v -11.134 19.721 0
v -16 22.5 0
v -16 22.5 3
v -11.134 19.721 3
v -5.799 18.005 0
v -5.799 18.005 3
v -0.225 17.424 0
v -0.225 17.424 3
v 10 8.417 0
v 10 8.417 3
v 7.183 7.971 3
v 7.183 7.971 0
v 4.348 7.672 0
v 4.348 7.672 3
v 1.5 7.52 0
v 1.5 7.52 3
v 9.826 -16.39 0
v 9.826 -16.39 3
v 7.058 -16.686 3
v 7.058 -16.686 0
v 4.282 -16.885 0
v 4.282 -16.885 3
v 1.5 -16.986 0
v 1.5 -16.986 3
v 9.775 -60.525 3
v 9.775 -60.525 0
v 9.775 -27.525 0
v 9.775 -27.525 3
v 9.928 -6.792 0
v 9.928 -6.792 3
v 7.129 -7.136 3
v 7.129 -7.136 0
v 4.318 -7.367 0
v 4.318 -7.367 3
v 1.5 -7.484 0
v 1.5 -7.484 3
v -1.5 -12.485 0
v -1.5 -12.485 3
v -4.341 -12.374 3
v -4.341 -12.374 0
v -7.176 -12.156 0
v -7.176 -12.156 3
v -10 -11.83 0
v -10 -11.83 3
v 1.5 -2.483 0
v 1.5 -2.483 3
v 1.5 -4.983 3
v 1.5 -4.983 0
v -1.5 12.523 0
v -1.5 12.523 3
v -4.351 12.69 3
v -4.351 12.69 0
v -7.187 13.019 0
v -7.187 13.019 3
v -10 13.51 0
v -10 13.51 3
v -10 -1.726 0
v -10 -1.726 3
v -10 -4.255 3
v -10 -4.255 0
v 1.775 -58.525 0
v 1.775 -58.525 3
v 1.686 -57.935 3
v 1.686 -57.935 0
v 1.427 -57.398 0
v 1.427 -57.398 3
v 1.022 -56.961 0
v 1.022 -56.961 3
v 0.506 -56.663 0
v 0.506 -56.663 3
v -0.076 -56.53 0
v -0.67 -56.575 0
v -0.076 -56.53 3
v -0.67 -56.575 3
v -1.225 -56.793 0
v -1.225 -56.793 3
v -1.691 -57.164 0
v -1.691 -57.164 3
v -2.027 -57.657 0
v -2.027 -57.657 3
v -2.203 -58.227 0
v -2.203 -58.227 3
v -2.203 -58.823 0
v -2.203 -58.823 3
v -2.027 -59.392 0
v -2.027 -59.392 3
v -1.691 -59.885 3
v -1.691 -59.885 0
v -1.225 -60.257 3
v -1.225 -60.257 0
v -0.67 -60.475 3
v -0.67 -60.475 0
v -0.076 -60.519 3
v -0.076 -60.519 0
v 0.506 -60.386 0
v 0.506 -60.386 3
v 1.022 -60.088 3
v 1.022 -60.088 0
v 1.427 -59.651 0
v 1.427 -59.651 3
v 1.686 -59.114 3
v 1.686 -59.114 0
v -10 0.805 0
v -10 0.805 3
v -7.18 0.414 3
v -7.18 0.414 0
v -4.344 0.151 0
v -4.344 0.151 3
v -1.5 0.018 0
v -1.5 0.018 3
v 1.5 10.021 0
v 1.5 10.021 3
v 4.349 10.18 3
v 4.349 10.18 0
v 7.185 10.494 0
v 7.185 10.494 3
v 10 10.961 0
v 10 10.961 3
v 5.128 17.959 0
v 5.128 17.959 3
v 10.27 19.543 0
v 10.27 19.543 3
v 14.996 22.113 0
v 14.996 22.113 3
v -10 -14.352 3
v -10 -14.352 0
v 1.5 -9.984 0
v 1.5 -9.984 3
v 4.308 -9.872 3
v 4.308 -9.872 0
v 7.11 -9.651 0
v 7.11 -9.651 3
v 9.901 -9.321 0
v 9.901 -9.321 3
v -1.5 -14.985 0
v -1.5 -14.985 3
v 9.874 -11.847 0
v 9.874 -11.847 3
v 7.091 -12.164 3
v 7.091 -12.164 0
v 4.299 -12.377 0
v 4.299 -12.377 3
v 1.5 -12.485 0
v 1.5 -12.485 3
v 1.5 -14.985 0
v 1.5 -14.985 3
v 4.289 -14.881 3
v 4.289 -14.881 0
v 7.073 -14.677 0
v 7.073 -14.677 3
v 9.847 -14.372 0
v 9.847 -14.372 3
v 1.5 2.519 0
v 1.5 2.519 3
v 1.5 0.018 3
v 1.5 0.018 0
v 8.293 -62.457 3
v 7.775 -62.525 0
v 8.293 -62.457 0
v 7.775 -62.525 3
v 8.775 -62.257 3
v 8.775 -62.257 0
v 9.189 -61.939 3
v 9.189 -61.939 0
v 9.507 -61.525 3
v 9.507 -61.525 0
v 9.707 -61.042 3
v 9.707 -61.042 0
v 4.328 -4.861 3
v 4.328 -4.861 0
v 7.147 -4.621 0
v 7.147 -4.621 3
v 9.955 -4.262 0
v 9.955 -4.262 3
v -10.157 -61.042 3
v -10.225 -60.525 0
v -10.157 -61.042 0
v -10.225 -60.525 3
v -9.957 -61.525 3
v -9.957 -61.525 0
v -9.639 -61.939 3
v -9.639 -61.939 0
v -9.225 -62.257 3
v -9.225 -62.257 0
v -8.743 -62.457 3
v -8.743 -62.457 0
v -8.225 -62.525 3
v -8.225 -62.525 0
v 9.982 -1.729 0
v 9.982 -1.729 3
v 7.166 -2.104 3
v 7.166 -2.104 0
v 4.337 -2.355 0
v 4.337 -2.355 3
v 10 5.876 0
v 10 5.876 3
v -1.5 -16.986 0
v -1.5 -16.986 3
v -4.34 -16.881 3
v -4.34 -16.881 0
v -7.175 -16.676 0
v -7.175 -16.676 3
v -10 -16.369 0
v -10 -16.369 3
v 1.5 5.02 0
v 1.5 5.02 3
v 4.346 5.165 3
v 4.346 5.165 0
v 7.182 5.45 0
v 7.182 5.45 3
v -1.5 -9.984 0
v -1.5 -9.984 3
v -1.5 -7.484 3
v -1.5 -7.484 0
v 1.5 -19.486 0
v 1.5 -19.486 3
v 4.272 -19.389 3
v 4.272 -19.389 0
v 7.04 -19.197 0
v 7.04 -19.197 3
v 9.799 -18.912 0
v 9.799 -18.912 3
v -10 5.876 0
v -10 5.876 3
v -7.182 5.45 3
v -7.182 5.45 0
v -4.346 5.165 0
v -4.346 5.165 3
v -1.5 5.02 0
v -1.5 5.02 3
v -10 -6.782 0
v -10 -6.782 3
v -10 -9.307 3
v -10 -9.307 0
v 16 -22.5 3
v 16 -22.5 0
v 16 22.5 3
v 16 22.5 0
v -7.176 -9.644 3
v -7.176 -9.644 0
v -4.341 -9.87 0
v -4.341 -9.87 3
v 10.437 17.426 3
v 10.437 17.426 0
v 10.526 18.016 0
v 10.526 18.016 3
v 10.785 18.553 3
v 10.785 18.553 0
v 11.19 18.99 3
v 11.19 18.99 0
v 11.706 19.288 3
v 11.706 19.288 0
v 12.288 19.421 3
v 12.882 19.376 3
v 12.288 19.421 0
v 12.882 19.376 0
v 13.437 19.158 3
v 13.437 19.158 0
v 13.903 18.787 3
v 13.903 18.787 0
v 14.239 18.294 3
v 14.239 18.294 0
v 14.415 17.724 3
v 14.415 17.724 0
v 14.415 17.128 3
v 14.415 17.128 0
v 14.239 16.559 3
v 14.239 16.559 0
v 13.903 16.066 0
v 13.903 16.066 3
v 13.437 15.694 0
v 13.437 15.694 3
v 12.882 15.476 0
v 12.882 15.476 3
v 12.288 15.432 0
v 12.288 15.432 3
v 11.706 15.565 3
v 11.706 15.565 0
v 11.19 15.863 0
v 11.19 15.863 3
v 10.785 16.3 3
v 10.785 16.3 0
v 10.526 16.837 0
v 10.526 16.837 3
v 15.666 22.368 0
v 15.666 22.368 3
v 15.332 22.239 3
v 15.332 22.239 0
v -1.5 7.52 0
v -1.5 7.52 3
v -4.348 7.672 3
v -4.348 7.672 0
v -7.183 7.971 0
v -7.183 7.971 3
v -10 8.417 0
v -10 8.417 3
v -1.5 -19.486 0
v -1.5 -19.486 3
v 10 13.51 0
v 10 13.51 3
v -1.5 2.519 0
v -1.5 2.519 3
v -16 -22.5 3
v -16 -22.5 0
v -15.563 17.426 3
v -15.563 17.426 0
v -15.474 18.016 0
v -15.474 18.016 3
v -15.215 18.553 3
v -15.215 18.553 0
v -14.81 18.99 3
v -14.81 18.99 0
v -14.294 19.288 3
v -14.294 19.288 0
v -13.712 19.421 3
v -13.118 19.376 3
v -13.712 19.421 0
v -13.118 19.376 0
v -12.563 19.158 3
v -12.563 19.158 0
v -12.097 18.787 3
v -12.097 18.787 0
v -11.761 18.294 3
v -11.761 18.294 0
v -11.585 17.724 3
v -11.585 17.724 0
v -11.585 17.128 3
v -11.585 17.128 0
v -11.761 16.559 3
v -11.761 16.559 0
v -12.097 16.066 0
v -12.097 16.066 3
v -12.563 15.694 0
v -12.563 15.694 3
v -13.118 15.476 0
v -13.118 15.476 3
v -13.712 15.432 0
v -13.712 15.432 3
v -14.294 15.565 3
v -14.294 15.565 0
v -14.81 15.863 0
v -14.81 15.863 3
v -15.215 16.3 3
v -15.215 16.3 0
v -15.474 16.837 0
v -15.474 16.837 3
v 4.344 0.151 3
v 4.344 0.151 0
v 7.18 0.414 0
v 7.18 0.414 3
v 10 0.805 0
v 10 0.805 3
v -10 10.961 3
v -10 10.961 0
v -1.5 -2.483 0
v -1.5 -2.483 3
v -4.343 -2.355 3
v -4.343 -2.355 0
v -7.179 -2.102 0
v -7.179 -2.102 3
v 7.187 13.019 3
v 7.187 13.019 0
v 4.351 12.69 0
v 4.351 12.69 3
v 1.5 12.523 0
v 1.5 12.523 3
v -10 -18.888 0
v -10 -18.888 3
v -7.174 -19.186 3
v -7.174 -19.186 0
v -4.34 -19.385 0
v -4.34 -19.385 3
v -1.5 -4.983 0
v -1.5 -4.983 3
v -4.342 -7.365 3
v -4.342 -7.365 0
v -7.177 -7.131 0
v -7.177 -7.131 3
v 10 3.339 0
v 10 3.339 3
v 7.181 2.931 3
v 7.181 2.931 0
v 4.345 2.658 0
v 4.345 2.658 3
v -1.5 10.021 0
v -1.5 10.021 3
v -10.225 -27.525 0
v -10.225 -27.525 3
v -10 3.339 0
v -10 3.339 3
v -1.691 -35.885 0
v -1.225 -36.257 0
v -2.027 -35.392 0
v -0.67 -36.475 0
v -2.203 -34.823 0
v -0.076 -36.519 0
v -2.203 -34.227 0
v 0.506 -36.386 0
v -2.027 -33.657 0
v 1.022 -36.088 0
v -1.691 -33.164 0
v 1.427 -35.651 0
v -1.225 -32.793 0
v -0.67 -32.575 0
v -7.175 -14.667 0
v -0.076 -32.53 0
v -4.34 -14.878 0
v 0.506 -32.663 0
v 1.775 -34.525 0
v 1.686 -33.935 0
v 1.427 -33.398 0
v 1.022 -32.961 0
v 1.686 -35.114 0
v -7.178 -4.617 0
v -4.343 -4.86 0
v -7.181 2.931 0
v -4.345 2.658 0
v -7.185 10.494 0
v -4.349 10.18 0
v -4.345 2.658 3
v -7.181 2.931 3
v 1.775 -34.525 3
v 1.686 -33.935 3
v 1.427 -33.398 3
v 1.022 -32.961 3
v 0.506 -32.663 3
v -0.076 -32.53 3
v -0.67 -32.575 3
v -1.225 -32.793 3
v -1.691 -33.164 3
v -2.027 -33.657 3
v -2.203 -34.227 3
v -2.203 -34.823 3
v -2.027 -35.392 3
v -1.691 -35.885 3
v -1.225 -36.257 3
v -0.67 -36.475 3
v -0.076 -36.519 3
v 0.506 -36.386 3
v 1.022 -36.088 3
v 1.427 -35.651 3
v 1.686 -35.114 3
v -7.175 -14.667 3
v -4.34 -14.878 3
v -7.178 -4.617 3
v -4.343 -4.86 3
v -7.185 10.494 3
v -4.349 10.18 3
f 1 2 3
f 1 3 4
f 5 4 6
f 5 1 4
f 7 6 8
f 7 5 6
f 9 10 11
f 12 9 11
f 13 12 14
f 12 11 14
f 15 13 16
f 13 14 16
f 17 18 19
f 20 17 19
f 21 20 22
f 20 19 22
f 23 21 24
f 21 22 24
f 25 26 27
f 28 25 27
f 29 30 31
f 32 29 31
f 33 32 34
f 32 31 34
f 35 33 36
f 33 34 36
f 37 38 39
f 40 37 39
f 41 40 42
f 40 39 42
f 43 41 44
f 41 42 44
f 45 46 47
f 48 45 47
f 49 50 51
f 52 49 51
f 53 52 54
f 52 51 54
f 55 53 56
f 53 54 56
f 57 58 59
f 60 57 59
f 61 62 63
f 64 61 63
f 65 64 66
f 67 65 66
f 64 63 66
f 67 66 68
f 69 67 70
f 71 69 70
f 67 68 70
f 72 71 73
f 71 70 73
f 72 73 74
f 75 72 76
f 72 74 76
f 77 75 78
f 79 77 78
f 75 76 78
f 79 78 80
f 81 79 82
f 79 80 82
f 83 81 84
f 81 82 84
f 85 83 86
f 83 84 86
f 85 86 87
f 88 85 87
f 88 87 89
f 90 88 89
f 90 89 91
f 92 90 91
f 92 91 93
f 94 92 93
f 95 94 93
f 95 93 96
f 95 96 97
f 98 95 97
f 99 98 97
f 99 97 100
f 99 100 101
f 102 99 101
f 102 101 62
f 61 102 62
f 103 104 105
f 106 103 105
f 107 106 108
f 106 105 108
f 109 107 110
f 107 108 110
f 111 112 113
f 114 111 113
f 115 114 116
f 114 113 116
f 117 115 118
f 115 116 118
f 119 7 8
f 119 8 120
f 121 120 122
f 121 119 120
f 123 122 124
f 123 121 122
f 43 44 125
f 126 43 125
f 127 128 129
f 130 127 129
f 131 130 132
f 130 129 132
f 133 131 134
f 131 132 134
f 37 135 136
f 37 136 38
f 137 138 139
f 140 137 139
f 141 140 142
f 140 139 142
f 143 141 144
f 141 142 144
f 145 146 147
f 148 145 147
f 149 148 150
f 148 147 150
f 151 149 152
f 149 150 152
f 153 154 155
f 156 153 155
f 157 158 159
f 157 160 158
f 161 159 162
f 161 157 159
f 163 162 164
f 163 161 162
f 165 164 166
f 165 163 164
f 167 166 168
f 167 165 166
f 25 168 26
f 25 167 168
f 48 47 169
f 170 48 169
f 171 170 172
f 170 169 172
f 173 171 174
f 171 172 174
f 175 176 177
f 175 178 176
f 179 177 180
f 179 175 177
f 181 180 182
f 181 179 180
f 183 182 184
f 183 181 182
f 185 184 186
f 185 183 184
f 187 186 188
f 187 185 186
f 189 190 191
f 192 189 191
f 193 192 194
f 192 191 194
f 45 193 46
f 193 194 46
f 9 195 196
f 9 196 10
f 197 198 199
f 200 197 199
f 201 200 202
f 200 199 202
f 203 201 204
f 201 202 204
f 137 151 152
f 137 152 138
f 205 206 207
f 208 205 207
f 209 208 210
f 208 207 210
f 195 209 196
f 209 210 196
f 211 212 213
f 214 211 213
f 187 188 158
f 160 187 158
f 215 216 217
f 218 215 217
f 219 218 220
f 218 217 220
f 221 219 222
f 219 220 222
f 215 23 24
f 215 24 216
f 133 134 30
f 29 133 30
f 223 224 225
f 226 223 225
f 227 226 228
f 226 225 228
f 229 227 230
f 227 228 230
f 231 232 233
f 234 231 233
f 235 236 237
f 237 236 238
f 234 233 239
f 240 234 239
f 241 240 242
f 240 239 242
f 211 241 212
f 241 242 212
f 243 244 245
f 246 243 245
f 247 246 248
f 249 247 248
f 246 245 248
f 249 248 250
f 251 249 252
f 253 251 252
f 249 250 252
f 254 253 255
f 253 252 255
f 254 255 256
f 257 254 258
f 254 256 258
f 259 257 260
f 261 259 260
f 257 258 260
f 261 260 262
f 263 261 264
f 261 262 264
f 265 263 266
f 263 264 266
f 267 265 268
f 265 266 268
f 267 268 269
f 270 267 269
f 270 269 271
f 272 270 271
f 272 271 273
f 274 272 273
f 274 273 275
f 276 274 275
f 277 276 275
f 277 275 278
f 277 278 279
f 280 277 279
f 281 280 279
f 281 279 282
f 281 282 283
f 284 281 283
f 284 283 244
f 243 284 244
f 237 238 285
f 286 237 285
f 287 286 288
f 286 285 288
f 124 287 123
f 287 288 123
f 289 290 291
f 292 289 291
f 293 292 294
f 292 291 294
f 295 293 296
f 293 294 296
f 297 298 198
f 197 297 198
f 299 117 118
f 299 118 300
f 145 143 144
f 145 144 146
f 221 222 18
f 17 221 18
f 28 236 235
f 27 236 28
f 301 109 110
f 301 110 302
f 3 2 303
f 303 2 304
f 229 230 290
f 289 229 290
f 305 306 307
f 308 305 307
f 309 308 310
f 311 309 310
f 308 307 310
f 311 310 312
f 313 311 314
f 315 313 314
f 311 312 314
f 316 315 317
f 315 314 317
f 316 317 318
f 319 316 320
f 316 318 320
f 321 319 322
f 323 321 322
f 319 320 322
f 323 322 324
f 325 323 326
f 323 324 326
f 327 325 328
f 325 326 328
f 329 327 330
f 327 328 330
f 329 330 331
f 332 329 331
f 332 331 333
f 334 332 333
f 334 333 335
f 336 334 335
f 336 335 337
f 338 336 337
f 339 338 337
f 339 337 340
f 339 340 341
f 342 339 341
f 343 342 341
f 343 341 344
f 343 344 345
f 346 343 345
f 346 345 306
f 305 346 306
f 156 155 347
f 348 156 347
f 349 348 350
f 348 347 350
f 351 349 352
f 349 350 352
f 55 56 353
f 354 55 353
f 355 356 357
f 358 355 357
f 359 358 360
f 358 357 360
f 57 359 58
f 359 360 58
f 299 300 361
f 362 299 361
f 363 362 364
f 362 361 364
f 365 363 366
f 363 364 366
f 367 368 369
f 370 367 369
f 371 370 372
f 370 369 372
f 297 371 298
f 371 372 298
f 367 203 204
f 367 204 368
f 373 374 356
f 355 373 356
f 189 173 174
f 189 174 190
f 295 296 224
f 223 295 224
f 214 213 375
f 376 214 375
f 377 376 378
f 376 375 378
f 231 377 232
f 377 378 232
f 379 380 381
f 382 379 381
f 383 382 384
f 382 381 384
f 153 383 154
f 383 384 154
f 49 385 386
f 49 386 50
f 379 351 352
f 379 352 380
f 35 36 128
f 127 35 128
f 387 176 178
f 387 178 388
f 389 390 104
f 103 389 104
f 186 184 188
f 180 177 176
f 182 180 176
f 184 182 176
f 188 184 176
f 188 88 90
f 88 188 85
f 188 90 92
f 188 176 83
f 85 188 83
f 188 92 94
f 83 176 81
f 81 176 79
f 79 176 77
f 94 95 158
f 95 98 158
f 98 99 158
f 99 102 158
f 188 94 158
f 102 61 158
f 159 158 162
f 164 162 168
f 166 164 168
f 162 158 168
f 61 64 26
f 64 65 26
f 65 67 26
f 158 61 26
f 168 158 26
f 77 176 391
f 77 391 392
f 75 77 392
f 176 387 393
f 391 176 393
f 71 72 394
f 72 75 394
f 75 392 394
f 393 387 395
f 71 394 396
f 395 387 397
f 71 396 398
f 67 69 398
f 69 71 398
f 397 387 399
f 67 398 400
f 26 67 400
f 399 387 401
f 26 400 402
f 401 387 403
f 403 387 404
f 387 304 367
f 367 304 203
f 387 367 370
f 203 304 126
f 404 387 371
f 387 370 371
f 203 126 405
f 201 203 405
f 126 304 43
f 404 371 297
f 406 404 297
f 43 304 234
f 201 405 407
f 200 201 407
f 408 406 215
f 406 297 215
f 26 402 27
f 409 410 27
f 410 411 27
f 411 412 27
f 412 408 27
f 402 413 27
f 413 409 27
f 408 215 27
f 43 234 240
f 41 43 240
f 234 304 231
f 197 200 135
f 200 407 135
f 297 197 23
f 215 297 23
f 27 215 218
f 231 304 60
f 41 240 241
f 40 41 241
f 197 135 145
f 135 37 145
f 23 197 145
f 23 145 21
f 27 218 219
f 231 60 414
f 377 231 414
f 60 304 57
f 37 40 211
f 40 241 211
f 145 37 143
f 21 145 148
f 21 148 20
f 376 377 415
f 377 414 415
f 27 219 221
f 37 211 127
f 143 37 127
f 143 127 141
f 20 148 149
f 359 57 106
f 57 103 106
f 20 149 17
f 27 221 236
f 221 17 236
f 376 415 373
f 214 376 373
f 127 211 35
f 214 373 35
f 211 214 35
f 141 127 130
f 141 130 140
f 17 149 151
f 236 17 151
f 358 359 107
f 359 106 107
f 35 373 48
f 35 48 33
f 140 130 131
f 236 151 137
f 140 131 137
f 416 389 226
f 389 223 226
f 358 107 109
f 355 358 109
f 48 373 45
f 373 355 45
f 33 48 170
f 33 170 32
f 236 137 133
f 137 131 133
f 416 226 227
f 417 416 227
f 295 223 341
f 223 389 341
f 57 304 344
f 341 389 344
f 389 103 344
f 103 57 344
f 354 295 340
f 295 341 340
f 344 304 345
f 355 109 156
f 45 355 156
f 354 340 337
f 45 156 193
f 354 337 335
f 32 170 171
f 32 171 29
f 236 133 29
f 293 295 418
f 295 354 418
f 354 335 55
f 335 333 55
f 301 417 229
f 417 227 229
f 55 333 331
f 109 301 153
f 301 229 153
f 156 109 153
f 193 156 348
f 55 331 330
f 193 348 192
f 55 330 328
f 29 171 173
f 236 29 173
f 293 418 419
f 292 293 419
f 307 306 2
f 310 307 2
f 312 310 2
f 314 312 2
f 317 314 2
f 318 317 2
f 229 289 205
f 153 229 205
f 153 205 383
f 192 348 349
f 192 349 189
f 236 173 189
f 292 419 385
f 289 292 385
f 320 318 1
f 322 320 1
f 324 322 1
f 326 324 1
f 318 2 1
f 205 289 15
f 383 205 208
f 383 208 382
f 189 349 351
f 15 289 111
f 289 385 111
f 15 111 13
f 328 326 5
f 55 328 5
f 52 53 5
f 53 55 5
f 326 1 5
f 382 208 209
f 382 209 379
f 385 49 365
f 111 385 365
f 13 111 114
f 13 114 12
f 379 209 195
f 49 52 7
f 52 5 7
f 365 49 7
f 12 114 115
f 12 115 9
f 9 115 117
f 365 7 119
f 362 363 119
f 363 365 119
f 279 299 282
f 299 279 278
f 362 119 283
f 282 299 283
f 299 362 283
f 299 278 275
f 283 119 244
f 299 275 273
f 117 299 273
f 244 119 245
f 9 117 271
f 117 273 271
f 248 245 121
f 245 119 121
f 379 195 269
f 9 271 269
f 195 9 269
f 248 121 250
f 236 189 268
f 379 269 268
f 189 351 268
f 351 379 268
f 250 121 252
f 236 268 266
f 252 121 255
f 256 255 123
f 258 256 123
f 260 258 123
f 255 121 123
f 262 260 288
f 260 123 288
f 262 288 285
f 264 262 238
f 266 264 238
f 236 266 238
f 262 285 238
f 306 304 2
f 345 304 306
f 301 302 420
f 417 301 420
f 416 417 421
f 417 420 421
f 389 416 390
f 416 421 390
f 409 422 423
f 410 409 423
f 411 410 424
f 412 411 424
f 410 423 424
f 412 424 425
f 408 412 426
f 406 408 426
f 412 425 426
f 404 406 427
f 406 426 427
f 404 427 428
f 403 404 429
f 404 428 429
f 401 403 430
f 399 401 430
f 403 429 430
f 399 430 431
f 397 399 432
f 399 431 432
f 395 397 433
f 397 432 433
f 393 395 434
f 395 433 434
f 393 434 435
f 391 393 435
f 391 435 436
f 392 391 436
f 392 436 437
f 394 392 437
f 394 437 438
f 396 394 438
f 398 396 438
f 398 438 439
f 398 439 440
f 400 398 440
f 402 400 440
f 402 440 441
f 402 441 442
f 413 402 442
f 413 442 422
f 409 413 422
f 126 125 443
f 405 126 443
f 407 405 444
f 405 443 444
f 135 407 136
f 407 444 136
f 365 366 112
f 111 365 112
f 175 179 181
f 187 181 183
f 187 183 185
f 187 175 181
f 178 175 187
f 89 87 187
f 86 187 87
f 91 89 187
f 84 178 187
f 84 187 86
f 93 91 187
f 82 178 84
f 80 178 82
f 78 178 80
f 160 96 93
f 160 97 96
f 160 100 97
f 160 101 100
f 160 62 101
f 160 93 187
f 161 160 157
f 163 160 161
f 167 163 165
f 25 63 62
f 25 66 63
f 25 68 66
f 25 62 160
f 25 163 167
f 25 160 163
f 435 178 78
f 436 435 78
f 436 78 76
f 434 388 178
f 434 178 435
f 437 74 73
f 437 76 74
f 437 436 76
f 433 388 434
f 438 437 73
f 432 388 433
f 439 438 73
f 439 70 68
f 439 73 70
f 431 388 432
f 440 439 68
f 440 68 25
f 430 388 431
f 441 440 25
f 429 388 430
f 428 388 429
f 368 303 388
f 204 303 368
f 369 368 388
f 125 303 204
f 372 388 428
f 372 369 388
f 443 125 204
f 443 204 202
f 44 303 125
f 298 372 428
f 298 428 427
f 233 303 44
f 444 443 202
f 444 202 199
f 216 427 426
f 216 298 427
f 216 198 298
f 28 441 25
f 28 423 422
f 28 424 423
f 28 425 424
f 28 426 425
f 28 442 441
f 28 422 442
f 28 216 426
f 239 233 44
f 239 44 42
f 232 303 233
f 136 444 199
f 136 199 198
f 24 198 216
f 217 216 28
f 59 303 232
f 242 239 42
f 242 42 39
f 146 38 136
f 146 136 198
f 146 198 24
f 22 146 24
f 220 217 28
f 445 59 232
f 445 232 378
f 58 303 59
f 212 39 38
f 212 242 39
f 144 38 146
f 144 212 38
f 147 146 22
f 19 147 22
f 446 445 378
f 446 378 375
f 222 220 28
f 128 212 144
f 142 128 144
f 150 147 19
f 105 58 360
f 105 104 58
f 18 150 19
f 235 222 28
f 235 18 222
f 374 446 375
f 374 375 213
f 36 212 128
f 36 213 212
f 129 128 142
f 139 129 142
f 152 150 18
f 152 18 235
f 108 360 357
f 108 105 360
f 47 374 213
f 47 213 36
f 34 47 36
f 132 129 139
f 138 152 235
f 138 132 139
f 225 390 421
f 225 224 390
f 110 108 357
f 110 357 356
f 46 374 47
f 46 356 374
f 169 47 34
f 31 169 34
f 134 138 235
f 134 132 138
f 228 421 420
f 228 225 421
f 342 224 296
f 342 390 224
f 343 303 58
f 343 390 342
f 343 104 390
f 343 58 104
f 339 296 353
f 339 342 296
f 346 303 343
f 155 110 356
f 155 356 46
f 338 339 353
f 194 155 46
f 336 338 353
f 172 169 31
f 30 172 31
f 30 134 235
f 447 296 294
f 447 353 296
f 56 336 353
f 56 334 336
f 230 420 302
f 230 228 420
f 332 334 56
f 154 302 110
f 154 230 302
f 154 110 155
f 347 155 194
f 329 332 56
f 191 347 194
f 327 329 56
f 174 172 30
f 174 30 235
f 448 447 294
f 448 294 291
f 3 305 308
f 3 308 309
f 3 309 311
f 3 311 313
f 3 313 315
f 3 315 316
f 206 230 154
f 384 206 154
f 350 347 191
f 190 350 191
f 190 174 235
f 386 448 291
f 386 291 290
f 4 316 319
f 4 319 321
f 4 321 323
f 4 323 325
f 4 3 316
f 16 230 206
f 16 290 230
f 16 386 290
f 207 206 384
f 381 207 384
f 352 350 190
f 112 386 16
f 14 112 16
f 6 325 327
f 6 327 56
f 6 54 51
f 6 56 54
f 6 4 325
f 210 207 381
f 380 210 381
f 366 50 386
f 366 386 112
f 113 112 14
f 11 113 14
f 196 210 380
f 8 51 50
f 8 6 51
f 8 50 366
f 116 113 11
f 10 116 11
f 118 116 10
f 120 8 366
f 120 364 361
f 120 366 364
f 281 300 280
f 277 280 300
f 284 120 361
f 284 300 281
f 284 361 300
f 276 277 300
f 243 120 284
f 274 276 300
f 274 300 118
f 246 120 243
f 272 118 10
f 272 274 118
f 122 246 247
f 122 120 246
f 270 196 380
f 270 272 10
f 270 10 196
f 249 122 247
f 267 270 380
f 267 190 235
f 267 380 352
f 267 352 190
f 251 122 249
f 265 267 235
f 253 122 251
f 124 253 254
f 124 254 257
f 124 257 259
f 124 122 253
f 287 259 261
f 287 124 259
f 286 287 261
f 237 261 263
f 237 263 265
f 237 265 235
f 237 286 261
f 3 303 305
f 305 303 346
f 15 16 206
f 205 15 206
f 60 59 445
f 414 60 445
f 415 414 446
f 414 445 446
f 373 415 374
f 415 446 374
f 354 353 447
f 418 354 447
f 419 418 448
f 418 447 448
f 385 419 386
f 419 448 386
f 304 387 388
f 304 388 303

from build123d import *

# Parameters (mm, degrees)
SKETCH1_W                    = 20
SKETCH1_H                    = 35
BOSS_EXTRUDE1_DEPTH          = 3
FILLET5_R                    = 2
F_97_0_0059_DIAMETER_HOLE2_D = 3.000000096
F_97_0_0059_DIAMETER_HOLE4_D = 3.000000096
F_97_0_0059_DIAMETER_HOLE6_D = 3.000000096
F_97_0_0059_DIAMETER_HOLE7_D = 3.000000096
CUT_EXTRUDE1_DEPTH           = 3
BOSS_EXTRUDE3_START          = -3
SKETCH17_R                   = 1.500000048
BOSS_EXTRUDE3_DEPTH          = 3
CUT_EXTRUDE3_START           = -3
CUT_EXTRUDE3_DEPTH           = 3
SKETCH19_R                   = 2
CUT_EXTRUDE4_DEPTH           = 10
SKETCH20_R                   = 2
CUT_EXTRUDE6_DEPTH           = 10


with BuildPart() as part:
    # Sketch1 → Boss-Extrude1 (new body)
    with BuildSketch(Plane.XY):
        with BuildLine():
            Line((-16, 22.5), (-16, -22.5))
            Line((-16, -22.5), (16, -22.5))
            Line((16, -22.5), (16, 22.5))
            ThreePointArc((16, 22.5), (0, 19.418681543), (-16, 22.5))
        make_face()
        with Locations((-0.22513797, -45.024704694)):
            Rectangle(SKETCH1_W, SKETCH1_H)
        Polygon((9.77486203, -27.524704694), (-10.22513797, -27.524704694), (-16, -22.5), (16, -22.5), align=None)
    extrude(amount=BOSS_EXTRUDE1_DEPTH)

    # Fillet5
    fillet5_edges = [part.edges().sort_by_distance(p)[0] for p in [
        (9.77486203, -62.524704694, 1.5),
        (-10.22513797, -62.524704694, 1.5),
    ]]
    fillet(fillet5_edges, radius=FILLET5_R)

    # #97 (0.0059) Diameter Hole2 (through all)
    with Locations(Plane(origin=(-0.22513797, -57.524704694, 3), x_dir=(1, 0, 0), z_dir=(0, 0, 1))):
        with Locations((0, 0)):
            Hole(F_97_0_0059_DIAMETER_HOLE2_D / 2)

    # #97 (0.0059) Diameter Hole4 (through all)
    with Locations(Plane(origin=(-0.22513797, -32.524704694, 3), x_dir=(1, 0, 0), z_dir=(0, 0, 1))):
        with Locations((0, 0)):
            Hole(F_97_0_0059_DIAMETER_HOLE4_D / 2)

    # #97 (0.0059) Diameter Hole6 (through all)
    with Locations(Plane(origin=(-13.971666748, 19.647656364, 3), x_dir=(1, 0, 0), z_dir=(0, 0, 1))):
        with Locations((0, 0)):
            Hole(F_97_0_0059_DIAMETER_HOLE6_D / 2)

    # #97 (0.0059) Diameter Hole7 (through all)
    with Locations(Plane(origin=(13.932427901, 19.6445071, 3), x_dir=(1, 0, 0), z_dir=(0, 0, 1))):
        with Locations((0, 0)):
            Hole(F_97_0_0059_DIAMETER_HOLE7_D / 2)

    # Sketch15 → Cut-Extrude1 (cut)
    with BuildSketch(Plane.XY.offset(3)):
        with BuildLine():
            ThreePointArc((10, 13.510205144), (5.771168674, 12.834180646), (1.5, 12.522505065))
            Line((1.5, 12.522505065), (1.5, 10.021432946))
            ThreePointArc((1.5, 10.021432946), (5.769166403, 10.317946389), (10, 10.96117968))
            Line((10, 10.96117968), (10, 13.510205144))
        make_face()
        with BuildLine():
            Line((-1.5, 10.021432946), (-1.5, 12.522505065))
            ThreePointArc((-1.5, 12.522505065), (-5.771168674, 12.834180646), (-10, 13.510205144))
            Line((-10, 13.510205144), (-10, 10.96117968))
            ThreePointArc((-10, 10.96117968), (-5.769166403, 10.317946389), (-1.5, 10.021432946))
        make_face()
        with BuildLine():
            Line((-1.5, 5.019568547), (-1.5, 7.52045835))
            ThreePointArc((-1.5, 7.52045835), (-5.767436702, 7.803229767), (-10, 8.416730868))
            Line((-10, 8.416730868), (-10, 5.876241735))
            ThreePointArc((-10, 5.876241735), (-5.765932035, 5.289825837), (-1.5, 5.019568547))
        make_face()
        with BuildLine():
            ThreePointArc((10, 8.416730868), (5.767436702, 7.803229767), (1.5, 7.52045835))
            Line((1.5, 7.52045835), (1.5, 5.019568547))
            ThreePointArc((1.5, 5.019568547), (5.765932035, 5.289825837), (10, 5.876241735))
            Line((10, 5.876241735), (10, 8.416730868))
        make_face()
        with BuildLine():
            Line((-1.5, 0.018002593), (-1.5, 2.518752931))
            ThreePointArc((-1.5, 2.518752931), (-5.764614839, 2.777565222), (-10, 3.339202169))
            Line((-10, 3.339202169), (-10, 0.805186604))
            ThreePointArc((-10, 0.805186604), (-5.763455098, 0.266306671), (-1.5, 0.018002593))
        make_face()
        with BuildLine():
            ThreePointArc((10, 3.339202169), (5.764614839, 2.777565222), (1.5, 2.518752931))
            Line((1.5, 2.518752931), (1.5, 0.018002593))
            ThreePointArc((1.5, 0.018002593), (5.763455098, 0.266306671), (10, 0.805186604))
            Line((10, 0.805186604), (10, 3.339202169))
        make_face()
        with BuildLine():
            Line((-1.5, -4.983331275), (-1.5, -2.482690003))
            ThreePointArc((-1.5, -2.482690003), (-5.762428595, -2.244068583), (-10, -1.726162893))
            Line((-10, -1.726162893), (-10, -4.255149614))
            ThreePointArc((-10, -4.255149614), (-5.761515611, -4.753661148), (-1.5, -4.983331275))
        make_face()
        with BuildLine():
            ThreePointArc((9.981645143, -1.729018054), (5.753177309, -2.244891311), (1.5, -2.482690003))
            Line((1.5, -2.482690003), (1.5, -4.983331275))
            ThreePointArc((1.5, -4.983331275), (5.738725767, -4.755609629), (9.95475653, -4.261911465))
            Line((9.95475653, -4.261911465), (9.981645143, -1.729018054))
        make_face()
        with BuildLine():
            Line((-1.5, -9.984481098), (-1.5, -7.483926726))
            ThreePointArc((-1.5, -7.483926726), (-5.760699953, -7.262556834), (-10, -6.782032303))
            Line((-10, -6.782032303), (-10, -9.307033082))
            ThreePointArc((-10, -9.307033082), (-5.759968225, -9.770829288), (-1.5, -9.984481098))
        make_face()
        with BuildLine():
            ThreePointArc((9.927893429, -6.792401691), (5.724398551, -7.265544943), (1.5, -7.483926726))
            Line((1.5, -7.483926726), (1.5, -9.984481098))
            ThreePointArc((1.5, -9.984481098), (5.710178647, -9.774780247), (9.901053138, -9.320743151))
            Line((9.901053138, -9.320743151), (9.927893429, -6.792401691))
        make_face()
        with BuildLine():
            Line((-1.5, -14.985482511), (-1.5, -12.4849985))
            ThreePointArc((-1.5, -12.4849985), (-5.759309265, -12.278542088), (-10, -11.830343737))
            Line((-10, -11.830343737), (-10, -14.352130745))
            ThreePointArc((-10, -14.352130745), (-5.758713712, -14.78575041), (-1.5, -14.985482511))
        make_face()
        with BuildLine():
            Line((-1.5, -19.48627934), (-1.5, -16.985847797))
            ThreePointArc((-1.5, -16.985847797), (-5.758277571, -16.791186392), (-10, -16.368561544))
            Line((-10, -16.368561544), (-10, -18.887959798))
            ThreePointArc((-10, -18.887959798), (-5.757777051, -19.297603898), (-1.5, -19.48627934))
        make_face()
        with BuildLine():
            ThreePointArc((9.82600299, -16.390428223), (5.67082155, -16.797489134), (1.5, -16.985847797))
            Line((1.5, -16.985847797), (1.5, -19.48627934))
            ThreePointArc((1.5, -19.48627934), (5.656897905, -19.304642326), (9.799230566, -18.912376702))
            Line((9.799230566, -18.912376702), (9.82600299, -16.390428223))
        make_face()
        with BuildLine():
            ThreePointArc((9.874233328, -11.847155401), (5.69605187, -12.283387146), (1.5, -12.4849985))
            Line((1.5, -12.4849985), (1.5, -14.985482511))
            ThreePointArc((1.5, -14.985482511), (5.682006317, -14.791427754), (9.847431975, -14.371828933))
            Line((9.847431975, -14.371828933), (9.874233328, -11.847155401))
        make_face()
    extrude(amount=-CUT_EXTRUDE1_DEPTH, mode=Mode.SUBTRACT)

    # Sketch17 → Boss-Extrude3 (add)
    with BuildSketch(Plane.XY.offset(3).offset(BOSS_EXTRUDE3_START)):
        with Locations((-0.22513797, -57.524704694)):
            Circle(SKETCH17_R)
        with Locations((-0.22513797, -32.524704694)):
            Circle(SKETCH17_R)
        with Locations((-13.971666748, 19.647656364)):
            Circle(SKETCH17_R)
        with Locations((13.932427901, 19.6445071)):
            Circle(SKETCH17_R)
    extrude(amount=BOSS_EXTRUDE3_DEPTH)

    # Sketch18 → Cut-Extrude3 (cut)
    with BuildSketch(Plane.XY.offset(3).offset(CUT_EXTRUDE3_START)):
        with BuildLine():
            ThreePointArc((-16, 22.5), (-8.51081333, 18.724422317), (-0.22513797, 17.424234775))
            Line((-0.22513797, 17.424234775), (-0.22513797, 19.419269819))
            ThreePointArc((-0.22513797, 19.419269819), (-8.257511741, 20.217456322), (-16, 22.5))
        make_face()
        with BuildLine():
            Line((-0.22513797, 19.419269819), (-0.22513797, 17.424234775))
            ThreePointArc((-0.22513797, 17.424234775), (7.738274372, 18.622946482), (14.995922473, 22.11284475))
            ThreePointArc((14.995922473, 22.11284475), (7.507186902, 20.077810702), (-0.22513797, 19.419269819))
        make_face()
    extrude(amount=CUT_EXTRUDE3_DEPTH, mode=Mode.SUBTRACT)

    # Sketch19 → Cut-Extrude4 (cut)
    with BuildSketch(Plane.XY.offset(3)):
        with Locations((-0.22513797, -34.524704694)):
            Circle(SKETCH19_R)
        with Locations((-0.22513797, -58.524704694)):
            Circle(SKETCH19_R)
    extrude(amount=-CUT_EXTRUDE4_DEPTH, mode=Mode.SUBTRACT)

    # Sketch20 → Cut-Extrude6 (cut)
    with BuildSketch(Plane(origin=(0, 0, 0), x_dir=(-1, 0, 0), z_dir=(0, 0, -1))):
        with Locations((13.562993481, 17.426344688)):
            Circle(SKETCH20_R)
        with Locations((-12.437006519, 17.426344688)):
            Circle(SKETCH20_R)
    extrude(amount=-CUT_EXTRUDE6_DEPTH, mode=Mode.SUBTRACT)


solid = part.part
